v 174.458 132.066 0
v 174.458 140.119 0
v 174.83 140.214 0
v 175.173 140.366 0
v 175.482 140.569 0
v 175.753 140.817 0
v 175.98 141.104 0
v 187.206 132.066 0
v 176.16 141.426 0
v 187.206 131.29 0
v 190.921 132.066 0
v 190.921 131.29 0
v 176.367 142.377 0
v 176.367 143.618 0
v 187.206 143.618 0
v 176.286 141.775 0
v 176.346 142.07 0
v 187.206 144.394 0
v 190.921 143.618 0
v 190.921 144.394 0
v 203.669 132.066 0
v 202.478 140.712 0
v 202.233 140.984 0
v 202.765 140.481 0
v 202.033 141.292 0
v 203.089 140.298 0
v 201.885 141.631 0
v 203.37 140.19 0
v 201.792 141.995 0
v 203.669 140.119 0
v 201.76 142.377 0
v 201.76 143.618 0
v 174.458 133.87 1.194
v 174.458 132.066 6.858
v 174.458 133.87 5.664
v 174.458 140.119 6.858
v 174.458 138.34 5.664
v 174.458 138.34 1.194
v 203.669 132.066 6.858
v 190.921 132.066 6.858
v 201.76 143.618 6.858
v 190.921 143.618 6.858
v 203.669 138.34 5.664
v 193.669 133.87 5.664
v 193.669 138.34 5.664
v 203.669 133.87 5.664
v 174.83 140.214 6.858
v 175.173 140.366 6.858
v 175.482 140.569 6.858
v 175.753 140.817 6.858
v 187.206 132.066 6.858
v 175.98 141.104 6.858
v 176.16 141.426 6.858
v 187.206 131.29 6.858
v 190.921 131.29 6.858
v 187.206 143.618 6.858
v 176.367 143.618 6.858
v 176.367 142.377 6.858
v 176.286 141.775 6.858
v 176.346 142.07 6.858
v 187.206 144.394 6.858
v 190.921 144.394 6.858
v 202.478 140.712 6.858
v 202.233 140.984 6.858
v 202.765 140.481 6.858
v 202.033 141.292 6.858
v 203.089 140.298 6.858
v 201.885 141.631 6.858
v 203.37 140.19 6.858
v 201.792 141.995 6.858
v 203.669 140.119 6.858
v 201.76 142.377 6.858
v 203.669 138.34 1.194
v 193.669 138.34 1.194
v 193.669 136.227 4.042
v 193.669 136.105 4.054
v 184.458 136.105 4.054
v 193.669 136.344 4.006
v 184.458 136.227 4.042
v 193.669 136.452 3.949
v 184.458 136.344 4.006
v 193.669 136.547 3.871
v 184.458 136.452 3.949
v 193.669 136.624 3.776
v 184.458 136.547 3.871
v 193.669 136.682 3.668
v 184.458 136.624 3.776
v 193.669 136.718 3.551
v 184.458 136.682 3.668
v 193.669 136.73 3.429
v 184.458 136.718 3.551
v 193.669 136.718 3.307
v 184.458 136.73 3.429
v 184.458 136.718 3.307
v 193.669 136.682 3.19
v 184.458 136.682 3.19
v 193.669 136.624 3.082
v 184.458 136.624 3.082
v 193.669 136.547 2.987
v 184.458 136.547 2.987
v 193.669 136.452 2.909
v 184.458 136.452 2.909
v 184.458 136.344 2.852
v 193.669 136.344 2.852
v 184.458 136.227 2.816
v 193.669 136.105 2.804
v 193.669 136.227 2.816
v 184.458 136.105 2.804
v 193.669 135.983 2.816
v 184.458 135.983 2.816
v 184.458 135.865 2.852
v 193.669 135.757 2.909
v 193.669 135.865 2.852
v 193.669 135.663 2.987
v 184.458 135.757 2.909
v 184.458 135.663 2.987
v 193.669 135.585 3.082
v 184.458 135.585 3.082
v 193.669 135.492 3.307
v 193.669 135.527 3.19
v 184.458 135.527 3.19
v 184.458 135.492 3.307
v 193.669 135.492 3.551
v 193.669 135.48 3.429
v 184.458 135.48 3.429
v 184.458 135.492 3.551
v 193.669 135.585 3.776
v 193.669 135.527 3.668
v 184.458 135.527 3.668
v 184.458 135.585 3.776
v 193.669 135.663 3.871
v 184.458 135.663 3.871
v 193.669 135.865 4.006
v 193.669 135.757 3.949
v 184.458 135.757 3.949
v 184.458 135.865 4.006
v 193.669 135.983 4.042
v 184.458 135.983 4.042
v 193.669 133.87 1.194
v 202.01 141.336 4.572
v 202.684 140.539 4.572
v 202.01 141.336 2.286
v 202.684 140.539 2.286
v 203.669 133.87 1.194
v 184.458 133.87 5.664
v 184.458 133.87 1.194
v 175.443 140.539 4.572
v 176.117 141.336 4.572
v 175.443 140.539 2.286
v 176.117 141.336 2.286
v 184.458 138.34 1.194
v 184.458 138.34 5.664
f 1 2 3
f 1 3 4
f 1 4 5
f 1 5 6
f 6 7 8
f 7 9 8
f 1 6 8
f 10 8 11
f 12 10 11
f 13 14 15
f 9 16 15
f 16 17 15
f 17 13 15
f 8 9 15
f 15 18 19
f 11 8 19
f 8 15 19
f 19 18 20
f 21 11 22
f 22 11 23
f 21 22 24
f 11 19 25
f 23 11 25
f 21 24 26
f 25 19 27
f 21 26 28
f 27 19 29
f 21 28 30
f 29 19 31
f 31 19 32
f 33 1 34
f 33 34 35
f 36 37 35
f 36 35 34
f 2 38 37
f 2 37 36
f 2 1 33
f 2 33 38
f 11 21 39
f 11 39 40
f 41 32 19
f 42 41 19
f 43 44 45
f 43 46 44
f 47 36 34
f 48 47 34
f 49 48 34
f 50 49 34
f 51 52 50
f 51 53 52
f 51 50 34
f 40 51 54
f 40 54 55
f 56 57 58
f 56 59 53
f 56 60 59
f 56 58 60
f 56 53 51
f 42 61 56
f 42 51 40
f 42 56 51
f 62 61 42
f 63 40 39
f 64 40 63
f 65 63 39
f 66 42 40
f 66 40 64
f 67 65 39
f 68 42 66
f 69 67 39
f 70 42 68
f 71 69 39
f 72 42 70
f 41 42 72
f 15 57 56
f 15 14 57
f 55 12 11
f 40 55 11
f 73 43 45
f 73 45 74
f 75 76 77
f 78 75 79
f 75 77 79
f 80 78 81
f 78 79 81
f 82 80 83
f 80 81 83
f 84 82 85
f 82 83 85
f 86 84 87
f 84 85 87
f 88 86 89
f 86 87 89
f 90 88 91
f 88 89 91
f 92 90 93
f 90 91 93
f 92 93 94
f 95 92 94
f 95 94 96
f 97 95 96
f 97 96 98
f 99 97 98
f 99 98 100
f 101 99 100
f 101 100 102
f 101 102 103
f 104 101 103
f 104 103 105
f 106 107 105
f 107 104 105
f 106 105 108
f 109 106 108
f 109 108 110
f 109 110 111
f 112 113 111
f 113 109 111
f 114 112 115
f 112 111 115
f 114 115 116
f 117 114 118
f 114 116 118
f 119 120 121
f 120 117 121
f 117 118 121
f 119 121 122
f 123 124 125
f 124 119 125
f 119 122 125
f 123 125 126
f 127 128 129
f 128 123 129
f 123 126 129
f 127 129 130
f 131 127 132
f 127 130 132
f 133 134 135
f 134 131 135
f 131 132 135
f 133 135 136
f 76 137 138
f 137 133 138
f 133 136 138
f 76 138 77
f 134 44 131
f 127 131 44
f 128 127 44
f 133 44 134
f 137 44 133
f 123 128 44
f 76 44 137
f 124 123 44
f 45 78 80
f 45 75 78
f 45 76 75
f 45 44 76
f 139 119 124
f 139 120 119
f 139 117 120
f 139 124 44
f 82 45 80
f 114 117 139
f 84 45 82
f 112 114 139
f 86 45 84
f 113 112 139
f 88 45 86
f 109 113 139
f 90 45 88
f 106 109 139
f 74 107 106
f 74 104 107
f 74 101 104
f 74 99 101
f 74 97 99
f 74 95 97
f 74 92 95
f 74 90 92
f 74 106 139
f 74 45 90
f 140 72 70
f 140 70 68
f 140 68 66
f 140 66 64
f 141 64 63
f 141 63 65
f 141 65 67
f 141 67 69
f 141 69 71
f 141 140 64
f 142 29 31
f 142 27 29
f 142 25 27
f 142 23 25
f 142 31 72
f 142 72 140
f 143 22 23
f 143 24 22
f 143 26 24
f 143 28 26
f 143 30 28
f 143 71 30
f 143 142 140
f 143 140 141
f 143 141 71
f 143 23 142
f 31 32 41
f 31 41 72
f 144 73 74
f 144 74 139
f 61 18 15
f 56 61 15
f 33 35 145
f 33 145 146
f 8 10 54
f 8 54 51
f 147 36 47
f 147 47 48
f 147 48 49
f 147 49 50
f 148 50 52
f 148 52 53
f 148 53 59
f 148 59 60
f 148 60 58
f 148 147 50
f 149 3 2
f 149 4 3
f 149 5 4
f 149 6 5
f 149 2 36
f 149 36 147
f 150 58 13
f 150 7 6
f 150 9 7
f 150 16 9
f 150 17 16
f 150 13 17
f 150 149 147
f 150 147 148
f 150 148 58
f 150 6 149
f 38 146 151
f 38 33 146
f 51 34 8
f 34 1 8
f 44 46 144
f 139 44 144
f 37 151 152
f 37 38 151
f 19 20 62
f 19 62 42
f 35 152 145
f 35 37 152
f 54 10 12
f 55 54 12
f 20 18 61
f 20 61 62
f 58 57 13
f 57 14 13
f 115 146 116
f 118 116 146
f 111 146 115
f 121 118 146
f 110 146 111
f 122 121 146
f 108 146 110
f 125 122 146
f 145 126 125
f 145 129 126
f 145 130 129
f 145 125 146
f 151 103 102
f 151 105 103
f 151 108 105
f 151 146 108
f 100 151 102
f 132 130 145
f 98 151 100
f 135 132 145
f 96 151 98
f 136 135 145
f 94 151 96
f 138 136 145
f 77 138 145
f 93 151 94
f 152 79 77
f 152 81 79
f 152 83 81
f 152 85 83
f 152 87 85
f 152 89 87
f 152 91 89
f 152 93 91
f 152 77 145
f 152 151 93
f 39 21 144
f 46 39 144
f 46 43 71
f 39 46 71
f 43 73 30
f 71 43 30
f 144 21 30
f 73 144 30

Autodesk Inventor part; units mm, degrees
ref_plane "YZ Plane" through (0, 0, 0) normal (1, 0, 0) x (0, 1, 0)
ref_plane "XZ Plane" through (0, 0, 0) normal (0, 1, 0) x (-1, 0, 0)
ref_plane "XY Plane" through (0, 0, 0) normal (0, 0, 1) x (1, 0, 0)
sketch "Sketch1" plane through (0, 0, 0) normal (0, 0, 1) x (1, 0, 0)
  point P0 (0, 0)
sketch "0" plane through (0, 0, 0) normal (0, 0, 1) x (1, 0, 0)
  spline S0 degree 3 poles (174.458, 140.1191) (175.5599, 140.3052) (176.3666, 141.2594) (176.3666, 142.3769) knots 0 0 0 0 1 1 1 1
  line L0 (174.458, 140.1191) -> (175.5599, 140.3052) construction
  line L1 (175.5599, 140.3052) -> (176.3666, 141.2594) construction
  line L2 (176.3666, 141.2594) -> (176.3666, 142.3769) construction
  spline S1 degree 3 poles (201.7605, 142.3769) (201.7605, 141.2594) (202.5671, 140.3052) (203.6686, 140.1191) knots 0 0 0 0 1 1 1 1
  line L3 (201.7605, 142.3769) -> (201.7605, 141.2594) construction
  line L4 (201.7605, 141.2594) -> (202.5671, 140.3052) construction
  line L5 (202.5671, 140.3052) -> (203.6686, 140.1191) construction
  line L6 (187.2059, 144.3939) -> (189.0634, 144.3939)
  line L7 (187.2059, 144.3939) -> (187.2059, 142.2564)
  line L8 (190.9207, 144.3939) -> (190.9207, 142.9173)
  line L9 (203.6686, 132.066) -> (203.6686, 140.1191)
  line L10 (201.7605, 143.6175) -> (201.7605, 142.3769)
  line L11 (174.458, 132.066) -> (187.2059, 132.066)
  line L12 (176.3666, 143.6175) -> (187.2059, 143.6175)
  line L13 (174.458, 132.066) -> (174.458, 140.1191)
  line L14 (176.3666, 143.6175) -> (176.3666, 142.3769)
  line L15 (203.6686, 132.066) -> (190.9207, 132.066)
  line L16 (201.7605, 143.6175) -> (190.9207, 143.6175)
  line L17 (190.9207, 130.2365) -> (190.9207, 145.2514)
  line L18 (189.0634, 131.2896) -> (189.0634, 144.3939)
  line L19 (189.0634, 131.2896) -> (189.0634, 144.3939)
  line L20 (189.0634, 131.2896) -> (189.0634, 144.3939)
  line L21 (193.4909, 136.8872) -> (192.7376, 136.8872)
  line L22 (192.4867, 136.8872) -> (192.2352, 136.8872)
  line L23 (191.984, 136.8872) -> (190.4774, 136.8872)
  line L24 (190.226, 136.8872) -> (189.9748, 136.8872)
  line L25 (189.7238, 136.8872) -> (188.2172, 136.8872)
  line L26 (187.966, 136.8872) -> (187.7145, 136.8872)
  line L27 (187.4633, 136.8872) -> (185.9567, 136.8872)
  line L28 (185.7055, 136.8872) -> (185.4546, 136.8872)
  line L29 (185.2031, 136.8872) -> (184.4498, 136.8872)
  line L30 (190.9207, 131.2896) -> (189.0634, 131.2896)
  line L31 (187.2059, 131.2896) -> (187.2059, 133.4271)
  line L32 (187.2059, 131.2896) -> (189.0634, 131.2896)
  line L33 (190.9207, 131.2896) -> (190.9207, 132.7662)
  line L34 (190.9207, 144.3939) -> (189.0634, 144.3939)
extrude "Extrusion1" add sketch "0" along normal blind 6.858
sketch "Sketch3" plane through (174.458, 132.066, 0) normal (-1, 0, 0) x (0, 0, 1)
  circle A0 centre (3.429, 4.0386) radius 0.625
  point P0 (0, -132.066)
  dimension "d2" = 1.25
extrude "Extrusion2" cut sketch "Sketch3" against normal through all
sketch "Sketch4" plane through (174.458, 132.066, 0) normal (-1, 0, 0) x (0, 0, 1)
  line L0 (1.194, 6.2736) -> (5.664, 6.2736)
  line L1 (5.664, 6.2736) -> (5.664, 1.8036)
  line L2 (5.664, 1.8036) -> (1.194, 1.8036)
  line L3 (1.194, 1.8036) -> (1.194, 6.2736)
  circle A0 centre (3.429, 4.0386) radius 0.625 projected
  line L4 (1.194, 6.2736) -> (5.664, 1.8036) construction
  line L5 (5.664, 6.2736) -> (1.194, 1.8036) construction
  point P0 (0, -132.066)
  dimension "d5" = 4.47
  dimension "d6" = 4.47
extrude "Extrusion3" cut sketch "Sketch4" against normal blind 10
sketch "Sketch5" plane through (203.6686, 132.066, 0) normal (1, 0, 0) x (0, 0, -1)
  line L0 (-5.664, 1.8036) -> (-1.194, 1.8036) projected
  line L1 (-5.664, 6.2736) -> (-1.194, 6.2736)
  line L2 (-1.194, 6.2736) -> (-1.194, 1.8036)
  line L3 (-1.194, 1.8036) -> (-5.664, 1.8036)
  line L4 (-5.664, 1.8036) -> (-5.664, 6.2736)
  circle A0 centre (-3.429, 4.0386) radius 0.625 projected
  line L5 (-5.664, 6.2736) -> (-1.194, 1.8036) construction
  line L6 (-1.194, 6.2736) -> (-5.664, 1.8036) construction
  point P0 (0, -132.066)
extrude "Extrusion4" cut sketch "Sketch5" against normal blind 10
properties part number "lc_lc_coupler_molex_1061251100_sd_scaled_3d" material "Acetal Resin, Black"
